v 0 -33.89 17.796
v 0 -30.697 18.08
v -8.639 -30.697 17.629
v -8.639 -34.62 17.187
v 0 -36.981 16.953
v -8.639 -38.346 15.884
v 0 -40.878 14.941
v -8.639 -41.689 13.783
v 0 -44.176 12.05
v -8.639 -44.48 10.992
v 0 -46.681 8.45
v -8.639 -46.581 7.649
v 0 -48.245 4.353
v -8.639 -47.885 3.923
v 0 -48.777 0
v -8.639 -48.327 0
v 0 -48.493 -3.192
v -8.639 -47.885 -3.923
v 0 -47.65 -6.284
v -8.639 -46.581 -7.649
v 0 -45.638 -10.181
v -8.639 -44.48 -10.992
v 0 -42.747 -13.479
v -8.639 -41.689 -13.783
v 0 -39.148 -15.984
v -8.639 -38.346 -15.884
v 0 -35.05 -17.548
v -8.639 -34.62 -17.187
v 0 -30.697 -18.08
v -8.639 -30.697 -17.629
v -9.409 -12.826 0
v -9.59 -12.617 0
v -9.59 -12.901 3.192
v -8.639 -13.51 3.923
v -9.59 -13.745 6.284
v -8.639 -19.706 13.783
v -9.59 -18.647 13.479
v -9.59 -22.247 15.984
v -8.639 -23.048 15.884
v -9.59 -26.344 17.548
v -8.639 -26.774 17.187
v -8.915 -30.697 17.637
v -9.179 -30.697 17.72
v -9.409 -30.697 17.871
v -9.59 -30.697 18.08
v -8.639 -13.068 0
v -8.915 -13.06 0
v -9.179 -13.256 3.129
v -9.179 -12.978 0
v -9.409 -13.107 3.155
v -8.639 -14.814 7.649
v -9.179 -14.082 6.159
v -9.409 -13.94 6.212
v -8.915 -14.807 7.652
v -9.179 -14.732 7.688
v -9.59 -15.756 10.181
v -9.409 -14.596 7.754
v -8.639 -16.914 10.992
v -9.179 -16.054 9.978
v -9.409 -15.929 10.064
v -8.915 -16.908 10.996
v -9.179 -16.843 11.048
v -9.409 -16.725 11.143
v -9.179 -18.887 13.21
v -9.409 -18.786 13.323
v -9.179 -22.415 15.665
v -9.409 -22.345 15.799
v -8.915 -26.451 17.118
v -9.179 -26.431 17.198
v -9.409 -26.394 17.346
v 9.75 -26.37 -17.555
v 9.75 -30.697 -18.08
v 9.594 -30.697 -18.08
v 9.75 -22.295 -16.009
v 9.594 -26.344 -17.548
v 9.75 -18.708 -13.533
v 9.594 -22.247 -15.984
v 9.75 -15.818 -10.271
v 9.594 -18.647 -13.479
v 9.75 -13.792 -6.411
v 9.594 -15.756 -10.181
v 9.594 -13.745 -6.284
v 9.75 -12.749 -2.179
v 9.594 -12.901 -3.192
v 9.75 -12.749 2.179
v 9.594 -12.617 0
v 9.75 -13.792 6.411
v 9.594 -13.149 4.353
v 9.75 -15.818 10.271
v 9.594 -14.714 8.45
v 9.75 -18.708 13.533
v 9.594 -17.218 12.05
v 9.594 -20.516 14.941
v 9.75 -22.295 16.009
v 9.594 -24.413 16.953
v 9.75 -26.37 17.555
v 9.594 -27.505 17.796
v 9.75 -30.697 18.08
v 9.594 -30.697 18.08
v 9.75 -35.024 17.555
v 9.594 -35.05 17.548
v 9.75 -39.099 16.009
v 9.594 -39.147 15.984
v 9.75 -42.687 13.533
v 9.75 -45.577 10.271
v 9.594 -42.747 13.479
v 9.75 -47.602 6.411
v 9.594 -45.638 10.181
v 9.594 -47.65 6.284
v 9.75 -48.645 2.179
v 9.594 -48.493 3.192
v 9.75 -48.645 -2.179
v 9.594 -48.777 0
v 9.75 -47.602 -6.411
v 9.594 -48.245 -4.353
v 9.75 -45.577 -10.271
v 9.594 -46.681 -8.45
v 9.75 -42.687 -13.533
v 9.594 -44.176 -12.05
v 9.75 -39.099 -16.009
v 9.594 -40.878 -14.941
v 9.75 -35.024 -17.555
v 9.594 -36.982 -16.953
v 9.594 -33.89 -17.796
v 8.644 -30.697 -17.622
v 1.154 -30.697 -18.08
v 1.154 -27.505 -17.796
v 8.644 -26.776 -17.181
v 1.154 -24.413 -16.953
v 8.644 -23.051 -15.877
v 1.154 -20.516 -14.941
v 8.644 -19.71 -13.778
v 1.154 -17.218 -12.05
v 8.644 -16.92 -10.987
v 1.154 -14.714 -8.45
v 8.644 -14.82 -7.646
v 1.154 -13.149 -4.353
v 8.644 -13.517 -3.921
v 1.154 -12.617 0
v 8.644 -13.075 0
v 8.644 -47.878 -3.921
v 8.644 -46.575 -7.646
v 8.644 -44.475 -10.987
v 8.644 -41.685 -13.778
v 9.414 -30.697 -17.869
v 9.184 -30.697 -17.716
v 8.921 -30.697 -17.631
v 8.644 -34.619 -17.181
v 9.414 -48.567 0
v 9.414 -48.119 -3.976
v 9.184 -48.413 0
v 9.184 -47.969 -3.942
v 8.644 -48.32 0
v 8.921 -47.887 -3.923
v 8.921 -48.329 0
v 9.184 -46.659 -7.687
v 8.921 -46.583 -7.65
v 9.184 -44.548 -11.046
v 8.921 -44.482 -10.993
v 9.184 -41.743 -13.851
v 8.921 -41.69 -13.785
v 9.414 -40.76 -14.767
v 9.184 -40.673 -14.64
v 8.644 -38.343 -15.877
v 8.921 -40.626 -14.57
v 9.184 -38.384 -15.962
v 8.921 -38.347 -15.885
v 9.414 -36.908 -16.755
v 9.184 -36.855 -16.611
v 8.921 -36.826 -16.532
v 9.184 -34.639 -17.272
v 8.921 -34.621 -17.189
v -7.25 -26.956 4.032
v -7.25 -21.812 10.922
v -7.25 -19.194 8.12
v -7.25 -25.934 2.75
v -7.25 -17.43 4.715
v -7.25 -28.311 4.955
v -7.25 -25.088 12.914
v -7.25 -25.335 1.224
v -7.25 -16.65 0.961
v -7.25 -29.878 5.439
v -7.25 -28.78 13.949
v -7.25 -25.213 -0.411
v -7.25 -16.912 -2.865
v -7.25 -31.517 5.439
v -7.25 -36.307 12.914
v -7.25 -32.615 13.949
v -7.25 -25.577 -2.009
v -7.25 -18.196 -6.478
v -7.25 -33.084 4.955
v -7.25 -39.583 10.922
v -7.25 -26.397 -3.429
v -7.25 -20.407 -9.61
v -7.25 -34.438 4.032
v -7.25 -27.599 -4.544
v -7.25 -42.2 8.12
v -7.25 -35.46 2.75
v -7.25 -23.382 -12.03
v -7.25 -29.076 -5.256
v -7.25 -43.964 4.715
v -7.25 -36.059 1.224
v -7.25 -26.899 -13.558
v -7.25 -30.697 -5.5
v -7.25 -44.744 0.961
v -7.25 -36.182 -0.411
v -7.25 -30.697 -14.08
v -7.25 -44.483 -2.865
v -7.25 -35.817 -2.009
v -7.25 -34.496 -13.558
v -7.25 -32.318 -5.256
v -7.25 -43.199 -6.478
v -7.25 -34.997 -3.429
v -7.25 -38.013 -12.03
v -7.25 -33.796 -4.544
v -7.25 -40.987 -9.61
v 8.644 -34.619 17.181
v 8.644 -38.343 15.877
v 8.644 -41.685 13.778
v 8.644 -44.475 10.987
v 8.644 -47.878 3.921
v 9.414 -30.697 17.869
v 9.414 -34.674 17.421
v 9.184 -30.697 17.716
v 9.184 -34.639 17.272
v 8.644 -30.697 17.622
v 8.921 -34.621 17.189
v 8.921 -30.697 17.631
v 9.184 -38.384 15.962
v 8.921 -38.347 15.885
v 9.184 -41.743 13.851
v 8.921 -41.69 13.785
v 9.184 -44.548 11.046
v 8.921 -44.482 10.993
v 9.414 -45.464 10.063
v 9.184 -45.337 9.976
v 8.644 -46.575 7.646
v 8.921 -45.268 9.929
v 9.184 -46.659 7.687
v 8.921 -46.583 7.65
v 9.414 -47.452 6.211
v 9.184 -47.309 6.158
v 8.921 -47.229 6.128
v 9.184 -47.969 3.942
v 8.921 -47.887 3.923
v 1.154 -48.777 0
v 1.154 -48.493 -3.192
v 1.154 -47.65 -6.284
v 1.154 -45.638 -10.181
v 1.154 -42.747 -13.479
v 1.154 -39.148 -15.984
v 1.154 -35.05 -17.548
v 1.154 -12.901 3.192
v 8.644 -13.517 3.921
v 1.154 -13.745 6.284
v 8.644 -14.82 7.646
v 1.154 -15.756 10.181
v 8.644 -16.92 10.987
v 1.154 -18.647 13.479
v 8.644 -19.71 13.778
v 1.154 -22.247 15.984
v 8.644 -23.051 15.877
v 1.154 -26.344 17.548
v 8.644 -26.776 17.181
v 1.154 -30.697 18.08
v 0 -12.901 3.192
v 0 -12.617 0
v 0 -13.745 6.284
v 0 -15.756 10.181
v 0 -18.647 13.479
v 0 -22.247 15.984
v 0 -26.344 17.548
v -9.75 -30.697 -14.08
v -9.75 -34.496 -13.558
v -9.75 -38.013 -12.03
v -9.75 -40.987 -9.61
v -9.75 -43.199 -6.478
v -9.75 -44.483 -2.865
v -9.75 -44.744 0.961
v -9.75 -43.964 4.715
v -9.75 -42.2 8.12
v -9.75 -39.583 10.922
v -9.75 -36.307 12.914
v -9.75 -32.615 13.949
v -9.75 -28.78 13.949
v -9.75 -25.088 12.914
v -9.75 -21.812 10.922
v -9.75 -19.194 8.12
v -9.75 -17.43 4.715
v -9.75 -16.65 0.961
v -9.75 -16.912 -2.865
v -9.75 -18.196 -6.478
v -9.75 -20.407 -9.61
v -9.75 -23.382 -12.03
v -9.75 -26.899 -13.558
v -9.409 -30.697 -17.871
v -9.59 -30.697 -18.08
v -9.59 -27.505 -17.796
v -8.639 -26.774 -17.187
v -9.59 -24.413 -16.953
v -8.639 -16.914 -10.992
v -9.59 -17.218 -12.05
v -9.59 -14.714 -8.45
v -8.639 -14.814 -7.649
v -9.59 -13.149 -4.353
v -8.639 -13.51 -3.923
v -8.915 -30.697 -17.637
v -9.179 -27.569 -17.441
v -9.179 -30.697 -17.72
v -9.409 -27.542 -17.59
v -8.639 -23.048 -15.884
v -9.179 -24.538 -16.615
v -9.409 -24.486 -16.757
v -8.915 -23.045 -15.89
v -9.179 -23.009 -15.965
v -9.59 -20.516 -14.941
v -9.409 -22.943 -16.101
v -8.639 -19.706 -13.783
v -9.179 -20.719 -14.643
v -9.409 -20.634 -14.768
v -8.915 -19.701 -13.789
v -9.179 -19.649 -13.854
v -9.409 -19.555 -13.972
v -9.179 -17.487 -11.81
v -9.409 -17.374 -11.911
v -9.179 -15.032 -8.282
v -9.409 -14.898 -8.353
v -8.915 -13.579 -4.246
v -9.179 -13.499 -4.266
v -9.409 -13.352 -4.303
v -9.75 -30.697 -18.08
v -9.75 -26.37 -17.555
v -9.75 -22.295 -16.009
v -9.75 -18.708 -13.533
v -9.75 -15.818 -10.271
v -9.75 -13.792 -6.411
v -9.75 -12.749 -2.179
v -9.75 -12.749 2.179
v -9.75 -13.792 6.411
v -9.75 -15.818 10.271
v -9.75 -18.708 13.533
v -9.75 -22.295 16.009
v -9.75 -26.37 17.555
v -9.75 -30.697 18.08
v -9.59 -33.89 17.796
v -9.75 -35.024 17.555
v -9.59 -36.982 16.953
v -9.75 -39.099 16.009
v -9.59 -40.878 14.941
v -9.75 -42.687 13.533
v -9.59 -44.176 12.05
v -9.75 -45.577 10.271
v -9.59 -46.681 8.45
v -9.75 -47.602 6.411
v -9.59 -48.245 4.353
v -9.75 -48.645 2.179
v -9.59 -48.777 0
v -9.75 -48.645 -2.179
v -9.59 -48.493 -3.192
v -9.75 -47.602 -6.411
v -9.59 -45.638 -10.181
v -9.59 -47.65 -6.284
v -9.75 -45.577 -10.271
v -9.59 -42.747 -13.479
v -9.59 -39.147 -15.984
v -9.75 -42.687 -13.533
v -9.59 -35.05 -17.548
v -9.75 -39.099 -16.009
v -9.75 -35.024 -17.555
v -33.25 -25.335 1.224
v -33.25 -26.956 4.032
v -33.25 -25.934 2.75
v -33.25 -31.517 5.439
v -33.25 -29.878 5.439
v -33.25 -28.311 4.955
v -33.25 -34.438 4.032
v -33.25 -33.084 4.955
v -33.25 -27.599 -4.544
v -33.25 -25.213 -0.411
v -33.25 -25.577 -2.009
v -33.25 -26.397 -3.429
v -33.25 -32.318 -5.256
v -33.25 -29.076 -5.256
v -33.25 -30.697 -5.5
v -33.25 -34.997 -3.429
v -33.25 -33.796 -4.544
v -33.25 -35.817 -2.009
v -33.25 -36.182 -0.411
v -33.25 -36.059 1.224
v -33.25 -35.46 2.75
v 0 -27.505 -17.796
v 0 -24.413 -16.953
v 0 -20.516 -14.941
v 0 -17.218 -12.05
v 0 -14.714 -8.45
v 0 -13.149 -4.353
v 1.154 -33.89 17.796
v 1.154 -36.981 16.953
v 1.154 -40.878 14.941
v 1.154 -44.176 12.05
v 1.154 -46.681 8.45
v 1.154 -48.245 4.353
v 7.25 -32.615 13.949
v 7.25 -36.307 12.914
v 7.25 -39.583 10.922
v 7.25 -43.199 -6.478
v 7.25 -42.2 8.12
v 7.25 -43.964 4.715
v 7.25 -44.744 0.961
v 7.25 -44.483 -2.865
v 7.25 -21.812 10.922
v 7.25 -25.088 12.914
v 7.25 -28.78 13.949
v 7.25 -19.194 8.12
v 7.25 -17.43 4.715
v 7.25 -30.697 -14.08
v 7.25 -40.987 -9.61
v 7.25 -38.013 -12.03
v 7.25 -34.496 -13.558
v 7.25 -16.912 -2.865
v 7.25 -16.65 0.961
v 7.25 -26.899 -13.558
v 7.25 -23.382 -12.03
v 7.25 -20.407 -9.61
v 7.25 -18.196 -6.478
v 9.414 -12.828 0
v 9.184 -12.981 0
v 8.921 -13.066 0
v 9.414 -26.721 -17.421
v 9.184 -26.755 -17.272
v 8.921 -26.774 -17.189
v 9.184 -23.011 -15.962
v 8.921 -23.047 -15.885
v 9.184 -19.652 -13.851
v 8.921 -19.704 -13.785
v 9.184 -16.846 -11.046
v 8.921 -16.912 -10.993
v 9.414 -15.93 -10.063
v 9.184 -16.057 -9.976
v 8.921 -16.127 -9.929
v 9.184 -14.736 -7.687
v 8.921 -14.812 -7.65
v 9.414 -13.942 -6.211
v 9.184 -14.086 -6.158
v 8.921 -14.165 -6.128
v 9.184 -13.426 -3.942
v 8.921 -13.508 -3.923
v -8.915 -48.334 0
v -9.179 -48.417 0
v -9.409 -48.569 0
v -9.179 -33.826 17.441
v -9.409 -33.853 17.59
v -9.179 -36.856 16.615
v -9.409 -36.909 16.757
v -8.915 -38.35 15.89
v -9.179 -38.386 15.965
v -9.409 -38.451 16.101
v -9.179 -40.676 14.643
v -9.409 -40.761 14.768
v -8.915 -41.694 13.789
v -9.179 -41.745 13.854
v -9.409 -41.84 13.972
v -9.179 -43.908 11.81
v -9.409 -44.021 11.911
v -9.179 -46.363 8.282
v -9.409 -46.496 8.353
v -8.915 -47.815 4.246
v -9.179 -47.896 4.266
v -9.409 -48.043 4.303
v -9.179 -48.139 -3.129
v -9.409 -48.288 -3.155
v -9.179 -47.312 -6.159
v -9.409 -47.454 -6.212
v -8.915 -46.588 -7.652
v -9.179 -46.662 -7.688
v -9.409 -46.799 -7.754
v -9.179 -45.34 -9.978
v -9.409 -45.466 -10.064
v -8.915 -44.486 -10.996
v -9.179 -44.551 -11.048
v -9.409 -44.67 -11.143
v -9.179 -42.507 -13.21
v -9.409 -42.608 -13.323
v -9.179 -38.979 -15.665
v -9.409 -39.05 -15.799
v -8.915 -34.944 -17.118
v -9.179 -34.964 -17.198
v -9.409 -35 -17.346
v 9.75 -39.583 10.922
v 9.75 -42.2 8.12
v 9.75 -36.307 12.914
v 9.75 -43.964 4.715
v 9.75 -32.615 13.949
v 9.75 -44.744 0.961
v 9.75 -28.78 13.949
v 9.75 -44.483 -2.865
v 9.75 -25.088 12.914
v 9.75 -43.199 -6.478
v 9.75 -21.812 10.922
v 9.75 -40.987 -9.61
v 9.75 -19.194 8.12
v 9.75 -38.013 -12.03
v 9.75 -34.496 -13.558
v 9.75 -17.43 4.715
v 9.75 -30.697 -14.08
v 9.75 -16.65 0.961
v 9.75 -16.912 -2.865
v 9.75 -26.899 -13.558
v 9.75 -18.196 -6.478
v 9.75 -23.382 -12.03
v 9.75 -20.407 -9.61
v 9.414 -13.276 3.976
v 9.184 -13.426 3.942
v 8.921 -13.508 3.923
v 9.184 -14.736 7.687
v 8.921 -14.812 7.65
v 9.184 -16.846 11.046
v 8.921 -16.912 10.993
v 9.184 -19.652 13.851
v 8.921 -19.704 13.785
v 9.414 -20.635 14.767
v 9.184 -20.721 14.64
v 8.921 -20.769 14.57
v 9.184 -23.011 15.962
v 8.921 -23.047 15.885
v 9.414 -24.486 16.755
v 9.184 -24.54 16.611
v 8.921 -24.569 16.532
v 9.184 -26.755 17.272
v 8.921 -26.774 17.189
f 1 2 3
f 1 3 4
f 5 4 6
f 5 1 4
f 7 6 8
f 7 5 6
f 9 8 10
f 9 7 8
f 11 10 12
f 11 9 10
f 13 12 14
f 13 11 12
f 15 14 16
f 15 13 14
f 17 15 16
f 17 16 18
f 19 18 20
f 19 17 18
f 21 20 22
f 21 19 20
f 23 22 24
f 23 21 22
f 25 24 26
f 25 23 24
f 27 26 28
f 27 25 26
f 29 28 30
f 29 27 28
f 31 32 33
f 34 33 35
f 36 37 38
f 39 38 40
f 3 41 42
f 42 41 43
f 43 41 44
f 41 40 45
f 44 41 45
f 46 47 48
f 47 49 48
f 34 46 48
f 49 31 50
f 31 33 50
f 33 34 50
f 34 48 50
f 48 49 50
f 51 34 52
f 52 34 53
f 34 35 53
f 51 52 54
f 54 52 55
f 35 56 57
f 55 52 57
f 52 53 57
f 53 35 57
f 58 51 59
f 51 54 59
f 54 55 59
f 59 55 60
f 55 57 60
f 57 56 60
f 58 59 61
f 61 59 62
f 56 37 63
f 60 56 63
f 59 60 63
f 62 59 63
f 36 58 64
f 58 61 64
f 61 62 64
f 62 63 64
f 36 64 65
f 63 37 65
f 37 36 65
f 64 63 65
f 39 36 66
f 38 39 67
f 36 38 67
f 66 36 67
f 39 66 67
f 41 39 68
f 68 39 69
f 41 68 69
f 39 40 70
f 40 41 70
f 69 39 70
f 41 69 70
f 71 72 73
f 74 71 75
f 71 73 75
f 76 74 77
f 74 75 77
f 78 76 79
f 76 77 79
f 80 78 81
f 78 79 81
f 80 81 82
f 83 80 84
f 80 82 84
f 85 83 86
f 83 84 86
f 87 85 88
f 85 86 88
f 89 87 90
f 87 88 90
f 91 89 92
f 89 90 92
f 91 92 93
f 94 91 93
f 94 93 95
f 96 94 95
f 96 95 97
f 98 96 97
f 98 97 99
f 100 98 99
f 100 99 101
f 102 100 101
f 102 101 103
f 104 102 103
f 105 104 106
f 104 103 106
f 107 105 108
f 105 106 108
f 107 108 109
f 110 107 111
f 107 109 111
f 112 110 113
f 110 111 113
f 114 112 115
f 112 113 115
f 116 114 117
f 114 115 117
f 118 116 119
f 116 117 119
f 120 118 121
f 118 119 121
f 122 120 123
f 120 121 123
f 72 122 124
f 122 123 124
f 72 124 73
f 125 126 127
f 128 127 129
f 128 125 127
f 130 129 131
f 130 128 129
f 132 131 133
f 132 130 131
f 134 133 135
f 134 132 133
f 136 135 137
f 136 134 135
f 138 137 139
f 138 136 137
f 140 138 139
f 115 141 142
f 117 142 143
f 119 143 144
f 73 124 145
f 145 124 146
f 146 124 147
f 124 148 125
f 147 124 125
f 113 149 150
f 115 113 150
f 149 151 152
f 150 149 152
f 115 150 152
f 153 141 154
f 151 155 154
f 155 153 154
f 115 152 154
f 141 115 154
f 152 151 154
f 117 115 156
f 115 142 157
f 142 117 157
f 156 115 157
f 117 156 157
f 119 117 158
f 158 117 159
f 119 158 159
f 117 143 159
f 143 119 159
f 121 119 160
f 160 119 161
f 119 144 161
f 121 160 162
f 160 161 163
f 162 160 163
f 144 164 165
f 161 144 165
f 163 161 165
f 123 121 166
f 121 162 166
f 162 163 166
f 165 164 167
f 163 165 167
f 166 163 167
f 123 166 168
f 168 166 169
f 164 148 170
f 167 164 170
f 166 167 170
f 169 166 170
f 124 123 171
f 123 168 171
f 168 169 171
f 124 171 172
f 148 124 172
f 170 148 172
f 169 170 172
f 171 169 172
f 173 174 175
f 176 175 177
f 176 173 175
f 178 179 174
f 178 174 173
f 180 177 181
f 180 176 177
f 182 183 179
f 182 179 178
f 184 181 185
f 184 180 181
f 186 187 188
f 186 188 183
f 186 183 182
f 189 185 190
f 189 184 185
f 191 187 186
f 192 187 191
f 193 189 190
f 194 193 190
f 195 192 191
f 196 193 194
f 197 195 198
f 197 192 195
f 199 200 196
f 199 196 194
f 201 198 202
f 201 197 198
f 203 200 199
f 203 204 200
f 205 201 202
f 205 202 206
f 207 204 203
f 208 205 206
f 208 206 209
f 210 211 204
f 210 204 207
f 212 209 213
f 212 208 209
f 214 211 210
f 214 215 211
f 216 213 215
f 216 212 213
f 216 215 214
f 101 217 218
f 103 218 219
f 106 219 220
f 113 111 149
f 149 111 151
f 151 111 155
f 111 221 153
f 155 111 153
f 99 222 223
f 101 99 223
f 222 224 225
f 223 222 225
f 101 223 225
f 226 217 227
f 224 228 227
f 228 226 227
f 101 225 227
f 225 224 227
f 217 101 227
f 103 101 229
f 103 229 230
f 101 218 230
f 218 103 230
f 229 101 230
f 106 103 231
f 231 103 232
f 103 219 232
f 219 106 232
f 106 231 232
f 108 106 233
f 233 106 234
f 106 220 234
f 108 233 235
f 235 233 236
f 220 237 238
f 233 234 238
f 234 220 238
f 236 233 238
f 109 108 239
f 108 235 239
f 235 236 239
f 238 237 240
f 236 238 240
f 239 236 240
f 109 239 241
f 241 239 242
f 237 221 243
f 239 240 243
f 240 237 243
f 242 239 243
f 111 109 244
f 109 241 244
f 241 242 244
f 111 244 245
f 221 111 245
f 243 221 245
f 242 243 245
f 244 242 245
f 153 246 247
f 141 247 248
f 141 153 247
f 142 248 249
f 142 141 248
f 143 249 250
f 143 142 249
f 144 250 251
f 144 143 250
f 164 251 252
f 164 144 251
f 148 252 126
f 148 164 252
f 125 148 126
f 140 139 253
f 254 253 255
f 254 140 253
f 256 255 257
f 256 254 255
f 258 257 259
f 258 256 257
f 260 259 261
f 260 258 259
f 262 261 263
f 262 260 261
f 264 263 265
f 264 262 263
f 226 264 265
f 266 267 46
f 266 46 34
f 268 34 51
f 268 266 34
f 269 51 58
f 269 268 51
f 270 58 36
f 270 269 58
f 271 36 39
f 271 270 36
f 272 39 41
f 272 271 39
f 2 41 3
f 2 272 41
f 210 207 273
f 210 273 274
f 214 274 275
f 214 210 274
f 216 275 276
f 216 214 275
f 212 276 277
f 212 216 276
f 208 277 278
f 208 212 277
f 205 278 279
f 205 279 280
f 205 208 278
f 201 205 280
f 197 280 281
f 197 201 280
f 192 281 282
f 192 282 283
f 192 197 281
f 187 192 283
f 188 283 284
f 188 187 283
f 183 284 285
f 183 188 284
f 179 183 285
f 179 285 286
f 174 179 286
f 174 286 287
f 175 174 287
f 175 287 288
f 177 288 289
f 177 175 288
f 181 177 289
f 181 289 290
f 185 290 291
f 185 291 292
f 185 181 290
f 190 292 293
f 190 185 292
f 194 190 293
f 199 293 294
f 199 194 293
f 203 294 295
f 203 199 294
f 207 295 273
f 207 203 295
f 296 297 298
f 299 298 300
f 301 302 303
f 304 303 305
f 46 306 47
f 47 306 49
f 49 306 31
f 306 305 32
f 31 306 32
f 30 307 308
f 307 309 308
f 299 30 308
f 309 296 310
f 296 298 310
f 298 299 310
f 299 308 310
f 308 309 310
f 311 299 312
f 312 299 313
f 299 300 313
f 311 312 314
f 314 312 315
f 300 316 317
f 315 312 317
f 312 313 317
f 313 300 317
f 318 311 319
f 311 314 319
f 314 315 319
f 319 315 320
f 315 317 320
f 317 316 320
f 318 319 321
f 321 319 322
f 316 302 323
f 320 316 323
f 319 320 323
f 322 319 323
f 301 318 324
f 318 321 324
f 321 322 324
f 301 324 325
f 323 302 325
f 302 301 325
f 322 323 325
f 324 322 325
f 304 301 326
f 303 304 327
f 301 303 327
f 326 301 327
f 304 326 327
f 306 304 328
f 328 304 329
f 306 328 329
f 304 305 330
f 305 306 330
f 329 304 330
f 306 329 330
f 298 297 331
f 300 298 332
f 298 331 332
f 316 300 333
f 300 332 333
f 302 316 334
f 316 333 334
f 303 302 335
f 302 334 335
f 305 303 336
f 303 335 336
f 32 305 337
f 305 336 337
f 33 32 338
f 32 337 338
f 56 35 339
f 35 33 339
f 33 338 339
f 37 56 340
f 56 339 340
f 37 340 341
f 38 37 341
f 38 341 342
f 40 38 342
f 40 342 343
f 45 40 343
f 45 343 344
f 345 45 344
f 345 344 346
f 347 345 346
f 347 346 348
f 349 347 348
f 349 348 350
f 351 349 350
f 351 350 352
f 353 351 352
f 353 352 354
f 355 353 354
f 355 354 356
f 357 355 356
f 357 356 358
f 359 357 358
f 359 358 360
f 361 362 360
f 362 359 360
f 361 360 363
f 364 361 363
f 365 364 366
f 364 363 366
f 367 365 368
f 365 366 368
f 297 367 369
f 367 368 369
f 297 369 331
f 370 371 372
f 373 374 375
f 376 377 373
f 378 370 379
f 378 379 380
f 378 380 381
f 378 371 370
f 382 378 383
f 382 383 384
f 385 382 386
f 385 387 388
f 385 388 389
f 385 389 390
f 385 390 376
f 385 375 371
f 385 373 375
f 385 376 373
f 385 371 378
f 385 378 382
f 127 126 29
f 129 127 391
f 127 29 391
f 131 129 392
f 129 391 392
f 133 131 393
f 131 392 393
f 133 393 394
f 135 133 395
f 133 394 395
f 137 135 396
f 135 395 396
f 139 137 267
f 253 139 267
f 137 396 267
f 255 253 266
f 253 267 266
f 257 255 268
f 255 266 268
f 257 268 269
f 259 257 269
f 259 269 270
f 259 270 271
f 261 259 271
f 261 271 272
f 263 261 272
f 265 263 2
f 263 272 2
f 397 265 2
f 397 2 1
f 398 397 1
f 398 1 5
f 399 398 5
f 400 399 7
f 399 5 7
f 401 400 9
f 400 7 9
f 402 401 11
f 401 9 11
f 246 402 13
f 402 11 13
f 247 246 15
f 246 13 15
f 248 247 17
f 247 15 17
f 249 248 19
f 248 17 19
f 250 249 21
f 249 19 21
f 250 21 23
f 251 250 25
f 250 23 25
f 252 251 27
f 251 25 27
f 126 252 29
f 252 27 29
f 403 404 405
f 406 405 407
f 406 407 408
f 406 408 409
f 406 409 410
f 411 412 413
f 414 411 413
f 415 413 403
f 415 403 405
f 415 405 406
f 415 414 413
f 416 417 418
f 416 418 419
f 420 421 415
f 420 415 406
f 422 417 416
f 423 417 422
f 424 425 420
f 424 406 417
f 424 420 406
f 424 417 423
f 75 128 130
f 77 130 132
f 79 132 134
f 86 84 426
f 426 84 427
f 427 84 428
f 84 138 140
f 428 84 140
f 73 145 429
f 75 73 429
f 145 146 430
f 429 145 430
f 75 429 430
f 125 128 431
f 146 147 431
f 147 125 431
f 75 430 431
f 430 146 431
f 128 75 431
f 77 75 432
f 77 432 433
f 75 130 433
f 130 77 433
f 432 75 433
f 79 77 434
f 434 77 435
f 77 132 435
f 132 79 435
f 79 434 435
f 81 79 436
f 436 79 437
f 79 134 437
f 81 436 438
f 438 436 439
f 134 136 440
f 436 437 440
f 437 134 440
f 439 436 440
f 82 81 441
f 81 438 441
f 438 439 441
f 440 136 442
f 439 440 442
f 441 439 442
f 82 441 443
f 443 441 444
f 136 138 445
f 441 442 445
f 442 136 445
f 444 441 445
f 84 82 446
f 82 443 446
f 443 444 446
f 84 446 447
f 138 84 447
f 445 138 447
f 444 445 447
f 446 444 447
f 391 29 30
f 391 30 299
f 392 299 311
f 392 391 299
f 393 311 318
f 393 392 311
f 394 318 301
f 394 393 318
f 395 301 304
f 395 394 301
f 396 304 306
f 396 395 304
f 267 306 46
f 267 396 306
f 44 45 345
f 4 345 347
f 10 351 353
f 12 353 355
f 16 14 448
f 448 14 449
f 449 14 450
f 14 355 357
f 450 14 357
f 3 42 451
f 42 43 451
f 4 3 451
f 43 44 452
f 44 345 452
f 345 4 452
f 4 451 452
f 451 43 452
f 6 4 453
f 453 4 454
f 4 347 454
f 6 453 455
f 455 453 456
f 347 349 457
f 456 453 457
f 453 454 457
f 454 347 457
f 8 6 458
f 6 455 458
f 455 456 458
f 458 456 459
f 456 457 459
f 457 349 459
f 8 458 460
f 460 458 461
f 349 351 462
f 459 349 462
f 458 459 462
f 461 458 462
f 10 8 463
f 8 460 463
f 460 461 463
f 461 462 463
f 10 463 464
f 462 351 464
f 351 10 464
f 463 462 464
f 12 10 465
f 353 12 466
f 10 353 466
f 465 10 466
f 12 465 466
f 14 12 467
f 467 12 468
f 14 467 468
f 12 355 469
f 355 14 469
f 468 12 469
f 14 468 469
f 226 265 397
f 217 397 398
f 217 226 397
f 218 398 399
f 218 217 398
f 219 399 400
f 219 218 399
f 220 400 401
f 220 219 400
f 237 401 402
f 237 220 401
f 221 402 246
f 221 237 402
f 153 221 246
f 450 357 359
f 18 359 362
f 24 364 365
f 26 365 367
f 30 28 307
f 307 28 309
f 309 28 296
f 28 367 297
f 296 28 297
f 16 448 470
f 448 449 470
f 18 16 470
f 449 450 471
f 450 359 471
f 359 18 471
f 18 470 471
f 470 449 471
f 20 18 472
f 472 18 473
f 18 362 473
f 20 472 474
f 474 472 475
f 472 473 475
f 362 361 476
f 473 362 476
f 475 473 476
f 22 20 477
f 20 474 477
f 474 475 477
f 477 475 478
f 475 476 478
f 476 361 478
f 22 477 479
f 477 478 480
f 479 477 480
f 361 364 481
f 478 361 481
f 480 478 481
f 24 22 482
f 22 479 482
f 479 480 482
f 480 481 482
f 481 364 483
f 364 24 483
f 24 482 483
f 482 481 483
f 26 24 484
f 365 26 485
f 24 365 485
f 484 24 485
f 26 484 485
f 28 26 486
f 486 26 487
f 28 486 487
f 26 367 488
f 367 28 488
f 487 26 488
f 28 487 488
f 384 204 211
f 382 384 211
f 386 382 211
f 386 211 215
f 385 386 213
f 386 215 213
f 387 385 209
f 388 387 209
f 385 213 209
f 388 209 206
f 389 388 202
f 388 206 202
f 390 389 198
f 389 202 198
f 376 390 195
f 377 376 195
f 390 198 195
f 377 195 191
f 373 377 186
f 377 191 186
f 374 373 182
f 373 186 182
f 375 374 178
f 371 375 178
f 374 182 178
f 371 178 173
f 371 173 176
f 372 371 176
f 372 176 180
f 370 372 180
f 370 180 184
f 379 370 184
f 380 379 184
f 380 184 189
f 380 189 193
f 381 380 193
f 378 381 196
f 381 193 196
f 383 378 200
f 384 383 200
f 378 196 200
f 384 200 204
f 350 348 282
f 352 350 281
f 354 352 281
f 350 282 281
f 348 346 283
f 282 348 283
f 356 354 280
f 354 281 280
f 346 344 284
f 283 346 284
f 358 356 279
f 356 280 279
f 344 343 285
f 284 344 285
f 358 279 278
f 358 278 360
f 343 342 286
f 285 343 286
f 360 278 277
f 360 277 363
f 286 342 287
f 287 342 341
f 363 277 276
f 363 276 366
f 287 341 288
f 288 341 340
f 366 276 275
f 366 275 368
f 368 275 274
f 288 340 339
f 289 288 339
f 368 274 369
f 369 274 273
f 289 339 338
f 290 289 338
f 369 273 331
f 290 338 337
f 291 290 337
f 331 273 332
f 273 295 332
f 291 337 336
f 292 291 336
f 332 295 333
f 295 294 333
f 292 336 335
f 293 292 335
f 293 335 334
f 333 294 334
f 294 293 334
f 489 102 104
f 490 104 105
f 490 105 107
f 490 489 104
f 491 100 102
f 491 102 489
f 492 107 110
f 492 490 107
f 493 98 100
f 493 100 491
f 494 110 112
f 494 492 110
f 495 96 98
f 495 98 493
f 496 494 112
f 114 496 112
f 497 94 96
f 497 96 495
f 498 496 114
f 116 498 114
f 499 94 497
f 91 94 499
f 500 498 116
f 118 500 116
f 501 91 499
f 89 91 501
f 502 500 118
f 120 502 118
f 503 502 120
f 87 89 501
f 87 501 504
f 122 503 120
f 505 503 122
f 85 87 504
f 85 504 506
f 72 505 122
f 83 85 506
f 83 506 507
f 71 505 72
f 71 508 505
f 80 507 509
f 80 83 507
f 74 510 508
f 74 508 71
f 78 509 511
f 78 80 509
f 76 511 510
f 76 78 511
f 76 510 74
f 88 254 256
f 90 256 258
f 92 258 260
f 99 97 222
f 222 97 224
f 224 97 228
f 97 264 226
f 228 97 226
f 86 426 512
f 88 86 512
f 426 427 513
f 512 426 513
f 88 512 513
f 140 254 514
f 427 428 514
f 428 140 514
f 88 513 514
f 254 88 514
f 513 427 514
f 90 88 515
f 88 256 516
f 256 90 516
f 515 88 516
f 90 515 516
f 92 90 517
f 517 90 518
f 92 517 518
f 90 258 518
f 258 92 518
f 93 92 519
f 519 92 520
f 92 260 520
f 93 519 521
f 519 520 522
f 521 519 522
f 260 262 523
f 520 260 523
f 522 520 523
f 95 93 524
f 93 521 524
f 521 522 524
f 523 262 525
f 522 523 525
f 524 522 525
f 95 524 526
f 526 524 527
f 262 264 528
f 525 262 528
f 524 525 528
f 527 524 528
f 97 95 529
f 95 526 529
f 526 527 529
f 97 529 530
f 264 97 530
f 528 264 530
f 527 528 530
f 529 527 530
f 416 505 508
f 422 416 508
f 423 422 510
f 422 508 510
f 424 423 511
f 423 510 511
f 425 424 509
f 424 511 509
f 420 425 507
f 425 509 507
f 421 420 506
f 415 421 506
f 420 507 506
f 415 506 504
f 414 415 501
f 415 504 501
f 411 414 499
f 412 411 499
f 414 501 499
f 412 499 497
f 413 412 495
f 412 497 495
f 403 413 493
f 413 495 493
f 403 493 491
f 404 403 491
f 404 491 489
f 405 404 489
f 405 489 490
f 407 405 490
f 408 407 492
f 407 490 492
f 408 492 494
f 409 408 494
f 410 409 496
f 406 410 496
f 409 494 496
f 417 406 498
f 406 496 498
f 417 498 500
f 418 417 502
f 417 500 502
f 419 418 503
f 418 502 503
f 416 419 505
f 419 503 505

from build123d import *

# Parameters (mm, degrees)
BOSS_EXTRU_1_DEPTH      = 9.75
BOSS_EXTRU_1_DEPTH_BACK = 9.75
ESQUISSE2_R             = 18.08
ESQUISSE4_R             = 14.08
ENL_V_MAT_EXTRU_1_DEPTH = 2.5
ENL_V_START             = -2.5
ESQUISSE5_R             = 14.08
ENL_V_MAT_EXTRU_2_DEPTH = 2.5
ESQUISSE6_R             = 5.5
BOSS_EXTRU_2_DEPTH      = 26


with BuildPart() as part:
    # Esquisse2 → Boss.-Extru.1 (new, two sides: drawn at the far end of the back side and taken through both)
    with BuildSketch(Plane(origin=(0, 0, 0), x_dir=(0, 0, -1), z_dir=(1, 0, 0)).offset(-BOSS_EXTRU_1_DEPTH_BACK)):
        with Locations((0, -30.697276077)):
            Circle(ESQUISSE2_R)
    extrude(amount=BOSS_EXTRU_1_DEPTH + BOSS_EXTRU_1_DEPTH_BACK)

    # Enlèvement de matière-Balayage1: sweep along a curve in space
    with BuildLine() as enl_vement_de_mati_re_balayage1_path:
        ThreePointArc((9.75, -30.697276077, -18.08), (9.75, -17.912785473, -12.784490604), (9.75, -12.617276077, 0))
        ThreePointArc((9.75, -12.617276077, 0), (9.75, -17.912785473, 12.784490604), (9.75, -30.697276077, 18.08))
        ThreePointArc((9.75, -30.697276077, 18.08), (9.75, -43.481766681, 12.784490604), (9.75, -48.777276077, 0))
        ThreePointArc((9.75, -48.777276077, 0), (9.75, -43.481766681, -12.784490604), (9.75, -30.697276077, -18.08))
    # Esquisse1 → Enlèvement de matière-Balayage1 (sweep, cut)
    with BuildSketch(Plane.XY):
        with BuildLine():
            Line((9.75, -1.705844805), (9.75, -12.080482835))
            ThreePointArc((9.75, -12.080482835), (9.418659658, -12.824051434), (8.644211477, -13.074871486))
            add(Edge.make_bspline(
                [(-8.639497918, -13.06789707), (-5.962658662, -12.770278108), (1.018950966, -12.480757929), (5.401157061, -12.729857554), (8.644211477, -13.074871486)],
                knots=[0.057340546, 0.057340546, 0.057340546, 0.057340546, 0.473274059, 0.946548119, 0.946548119, 0.946548119, 0.946548119], degree=3))
            ThreePointArc((-8.639497918, -13.06789707), (-9.416895013, -12.819172867), (-9.75, -12.074021177))
            Line((-9.75, -12.074021177), (-9.75, -1.69364433))
            ThreePointArc((-9.75, -1.69364433), (-9.265544866, -0.388606491), (-8.04687624, 0.284199066))
            add(Edge.make_bspline(
                [(-8.04687624, 0.284199066), (-5.709420251, 0.63505351), (1.539056453, 0.939568483), (5.000411491, 0.71370426), (8.036962294, 0.273461297)],
                knots=[0.08950135, 0.08950135, 0.08950135, 0.08950135, 0.457115955, 0.91423191, 0.91423191, 0.91423191, 0.91423191], degree=3))
            ThreePointArc((8.036962294, 0.273461297), (9.262270576, -0.397014141), (9.75, -1.705844805))
        make_face()
    sweep(path=enl_vement_de_mati_re_balayage1_path.line, mode=Mode.SUBTRACT)

    # Esquisse4 → Enlèv. mat.-Extru.1 (cut)
    with BuildSketch(Plane(origin=(9.75, 0, 0), x_dir=(0, 0, -1), z_dir=(1, 0, 0))):
        with Locations((0, -30.697276077)):
            Circle(ESQUISSE4_R)
    extrude(amount=-ENL_V_MAT_EXTRU_1_DEPTH, mode=Mode.SUBTRACT)

    # Esquisse5 → Enlèv. mat.-Extru.2 (cut)
    with BuildSketch(Plane.ZY.offset(9.75).offset(ENL_V_START)):
        with Locations((0, -30.697276077)):
            Circle(ESQUISSE5_R)
    extrude(amount=ENL_V_MAT_EXTRU_2_DEPTH, mode=Mode.SUBTRACT)

    # Esquisse6 → Boss.-Extru.2 (add)
    with BuildSketch(Plane.ZY.offset(7.25)):
        with Locations((0, -30.697276077)):
            Circle(ESQUISSE6_R)
    extrude(amount=BOSS_EXTRU_2_DEPTH)


solid = part.part
